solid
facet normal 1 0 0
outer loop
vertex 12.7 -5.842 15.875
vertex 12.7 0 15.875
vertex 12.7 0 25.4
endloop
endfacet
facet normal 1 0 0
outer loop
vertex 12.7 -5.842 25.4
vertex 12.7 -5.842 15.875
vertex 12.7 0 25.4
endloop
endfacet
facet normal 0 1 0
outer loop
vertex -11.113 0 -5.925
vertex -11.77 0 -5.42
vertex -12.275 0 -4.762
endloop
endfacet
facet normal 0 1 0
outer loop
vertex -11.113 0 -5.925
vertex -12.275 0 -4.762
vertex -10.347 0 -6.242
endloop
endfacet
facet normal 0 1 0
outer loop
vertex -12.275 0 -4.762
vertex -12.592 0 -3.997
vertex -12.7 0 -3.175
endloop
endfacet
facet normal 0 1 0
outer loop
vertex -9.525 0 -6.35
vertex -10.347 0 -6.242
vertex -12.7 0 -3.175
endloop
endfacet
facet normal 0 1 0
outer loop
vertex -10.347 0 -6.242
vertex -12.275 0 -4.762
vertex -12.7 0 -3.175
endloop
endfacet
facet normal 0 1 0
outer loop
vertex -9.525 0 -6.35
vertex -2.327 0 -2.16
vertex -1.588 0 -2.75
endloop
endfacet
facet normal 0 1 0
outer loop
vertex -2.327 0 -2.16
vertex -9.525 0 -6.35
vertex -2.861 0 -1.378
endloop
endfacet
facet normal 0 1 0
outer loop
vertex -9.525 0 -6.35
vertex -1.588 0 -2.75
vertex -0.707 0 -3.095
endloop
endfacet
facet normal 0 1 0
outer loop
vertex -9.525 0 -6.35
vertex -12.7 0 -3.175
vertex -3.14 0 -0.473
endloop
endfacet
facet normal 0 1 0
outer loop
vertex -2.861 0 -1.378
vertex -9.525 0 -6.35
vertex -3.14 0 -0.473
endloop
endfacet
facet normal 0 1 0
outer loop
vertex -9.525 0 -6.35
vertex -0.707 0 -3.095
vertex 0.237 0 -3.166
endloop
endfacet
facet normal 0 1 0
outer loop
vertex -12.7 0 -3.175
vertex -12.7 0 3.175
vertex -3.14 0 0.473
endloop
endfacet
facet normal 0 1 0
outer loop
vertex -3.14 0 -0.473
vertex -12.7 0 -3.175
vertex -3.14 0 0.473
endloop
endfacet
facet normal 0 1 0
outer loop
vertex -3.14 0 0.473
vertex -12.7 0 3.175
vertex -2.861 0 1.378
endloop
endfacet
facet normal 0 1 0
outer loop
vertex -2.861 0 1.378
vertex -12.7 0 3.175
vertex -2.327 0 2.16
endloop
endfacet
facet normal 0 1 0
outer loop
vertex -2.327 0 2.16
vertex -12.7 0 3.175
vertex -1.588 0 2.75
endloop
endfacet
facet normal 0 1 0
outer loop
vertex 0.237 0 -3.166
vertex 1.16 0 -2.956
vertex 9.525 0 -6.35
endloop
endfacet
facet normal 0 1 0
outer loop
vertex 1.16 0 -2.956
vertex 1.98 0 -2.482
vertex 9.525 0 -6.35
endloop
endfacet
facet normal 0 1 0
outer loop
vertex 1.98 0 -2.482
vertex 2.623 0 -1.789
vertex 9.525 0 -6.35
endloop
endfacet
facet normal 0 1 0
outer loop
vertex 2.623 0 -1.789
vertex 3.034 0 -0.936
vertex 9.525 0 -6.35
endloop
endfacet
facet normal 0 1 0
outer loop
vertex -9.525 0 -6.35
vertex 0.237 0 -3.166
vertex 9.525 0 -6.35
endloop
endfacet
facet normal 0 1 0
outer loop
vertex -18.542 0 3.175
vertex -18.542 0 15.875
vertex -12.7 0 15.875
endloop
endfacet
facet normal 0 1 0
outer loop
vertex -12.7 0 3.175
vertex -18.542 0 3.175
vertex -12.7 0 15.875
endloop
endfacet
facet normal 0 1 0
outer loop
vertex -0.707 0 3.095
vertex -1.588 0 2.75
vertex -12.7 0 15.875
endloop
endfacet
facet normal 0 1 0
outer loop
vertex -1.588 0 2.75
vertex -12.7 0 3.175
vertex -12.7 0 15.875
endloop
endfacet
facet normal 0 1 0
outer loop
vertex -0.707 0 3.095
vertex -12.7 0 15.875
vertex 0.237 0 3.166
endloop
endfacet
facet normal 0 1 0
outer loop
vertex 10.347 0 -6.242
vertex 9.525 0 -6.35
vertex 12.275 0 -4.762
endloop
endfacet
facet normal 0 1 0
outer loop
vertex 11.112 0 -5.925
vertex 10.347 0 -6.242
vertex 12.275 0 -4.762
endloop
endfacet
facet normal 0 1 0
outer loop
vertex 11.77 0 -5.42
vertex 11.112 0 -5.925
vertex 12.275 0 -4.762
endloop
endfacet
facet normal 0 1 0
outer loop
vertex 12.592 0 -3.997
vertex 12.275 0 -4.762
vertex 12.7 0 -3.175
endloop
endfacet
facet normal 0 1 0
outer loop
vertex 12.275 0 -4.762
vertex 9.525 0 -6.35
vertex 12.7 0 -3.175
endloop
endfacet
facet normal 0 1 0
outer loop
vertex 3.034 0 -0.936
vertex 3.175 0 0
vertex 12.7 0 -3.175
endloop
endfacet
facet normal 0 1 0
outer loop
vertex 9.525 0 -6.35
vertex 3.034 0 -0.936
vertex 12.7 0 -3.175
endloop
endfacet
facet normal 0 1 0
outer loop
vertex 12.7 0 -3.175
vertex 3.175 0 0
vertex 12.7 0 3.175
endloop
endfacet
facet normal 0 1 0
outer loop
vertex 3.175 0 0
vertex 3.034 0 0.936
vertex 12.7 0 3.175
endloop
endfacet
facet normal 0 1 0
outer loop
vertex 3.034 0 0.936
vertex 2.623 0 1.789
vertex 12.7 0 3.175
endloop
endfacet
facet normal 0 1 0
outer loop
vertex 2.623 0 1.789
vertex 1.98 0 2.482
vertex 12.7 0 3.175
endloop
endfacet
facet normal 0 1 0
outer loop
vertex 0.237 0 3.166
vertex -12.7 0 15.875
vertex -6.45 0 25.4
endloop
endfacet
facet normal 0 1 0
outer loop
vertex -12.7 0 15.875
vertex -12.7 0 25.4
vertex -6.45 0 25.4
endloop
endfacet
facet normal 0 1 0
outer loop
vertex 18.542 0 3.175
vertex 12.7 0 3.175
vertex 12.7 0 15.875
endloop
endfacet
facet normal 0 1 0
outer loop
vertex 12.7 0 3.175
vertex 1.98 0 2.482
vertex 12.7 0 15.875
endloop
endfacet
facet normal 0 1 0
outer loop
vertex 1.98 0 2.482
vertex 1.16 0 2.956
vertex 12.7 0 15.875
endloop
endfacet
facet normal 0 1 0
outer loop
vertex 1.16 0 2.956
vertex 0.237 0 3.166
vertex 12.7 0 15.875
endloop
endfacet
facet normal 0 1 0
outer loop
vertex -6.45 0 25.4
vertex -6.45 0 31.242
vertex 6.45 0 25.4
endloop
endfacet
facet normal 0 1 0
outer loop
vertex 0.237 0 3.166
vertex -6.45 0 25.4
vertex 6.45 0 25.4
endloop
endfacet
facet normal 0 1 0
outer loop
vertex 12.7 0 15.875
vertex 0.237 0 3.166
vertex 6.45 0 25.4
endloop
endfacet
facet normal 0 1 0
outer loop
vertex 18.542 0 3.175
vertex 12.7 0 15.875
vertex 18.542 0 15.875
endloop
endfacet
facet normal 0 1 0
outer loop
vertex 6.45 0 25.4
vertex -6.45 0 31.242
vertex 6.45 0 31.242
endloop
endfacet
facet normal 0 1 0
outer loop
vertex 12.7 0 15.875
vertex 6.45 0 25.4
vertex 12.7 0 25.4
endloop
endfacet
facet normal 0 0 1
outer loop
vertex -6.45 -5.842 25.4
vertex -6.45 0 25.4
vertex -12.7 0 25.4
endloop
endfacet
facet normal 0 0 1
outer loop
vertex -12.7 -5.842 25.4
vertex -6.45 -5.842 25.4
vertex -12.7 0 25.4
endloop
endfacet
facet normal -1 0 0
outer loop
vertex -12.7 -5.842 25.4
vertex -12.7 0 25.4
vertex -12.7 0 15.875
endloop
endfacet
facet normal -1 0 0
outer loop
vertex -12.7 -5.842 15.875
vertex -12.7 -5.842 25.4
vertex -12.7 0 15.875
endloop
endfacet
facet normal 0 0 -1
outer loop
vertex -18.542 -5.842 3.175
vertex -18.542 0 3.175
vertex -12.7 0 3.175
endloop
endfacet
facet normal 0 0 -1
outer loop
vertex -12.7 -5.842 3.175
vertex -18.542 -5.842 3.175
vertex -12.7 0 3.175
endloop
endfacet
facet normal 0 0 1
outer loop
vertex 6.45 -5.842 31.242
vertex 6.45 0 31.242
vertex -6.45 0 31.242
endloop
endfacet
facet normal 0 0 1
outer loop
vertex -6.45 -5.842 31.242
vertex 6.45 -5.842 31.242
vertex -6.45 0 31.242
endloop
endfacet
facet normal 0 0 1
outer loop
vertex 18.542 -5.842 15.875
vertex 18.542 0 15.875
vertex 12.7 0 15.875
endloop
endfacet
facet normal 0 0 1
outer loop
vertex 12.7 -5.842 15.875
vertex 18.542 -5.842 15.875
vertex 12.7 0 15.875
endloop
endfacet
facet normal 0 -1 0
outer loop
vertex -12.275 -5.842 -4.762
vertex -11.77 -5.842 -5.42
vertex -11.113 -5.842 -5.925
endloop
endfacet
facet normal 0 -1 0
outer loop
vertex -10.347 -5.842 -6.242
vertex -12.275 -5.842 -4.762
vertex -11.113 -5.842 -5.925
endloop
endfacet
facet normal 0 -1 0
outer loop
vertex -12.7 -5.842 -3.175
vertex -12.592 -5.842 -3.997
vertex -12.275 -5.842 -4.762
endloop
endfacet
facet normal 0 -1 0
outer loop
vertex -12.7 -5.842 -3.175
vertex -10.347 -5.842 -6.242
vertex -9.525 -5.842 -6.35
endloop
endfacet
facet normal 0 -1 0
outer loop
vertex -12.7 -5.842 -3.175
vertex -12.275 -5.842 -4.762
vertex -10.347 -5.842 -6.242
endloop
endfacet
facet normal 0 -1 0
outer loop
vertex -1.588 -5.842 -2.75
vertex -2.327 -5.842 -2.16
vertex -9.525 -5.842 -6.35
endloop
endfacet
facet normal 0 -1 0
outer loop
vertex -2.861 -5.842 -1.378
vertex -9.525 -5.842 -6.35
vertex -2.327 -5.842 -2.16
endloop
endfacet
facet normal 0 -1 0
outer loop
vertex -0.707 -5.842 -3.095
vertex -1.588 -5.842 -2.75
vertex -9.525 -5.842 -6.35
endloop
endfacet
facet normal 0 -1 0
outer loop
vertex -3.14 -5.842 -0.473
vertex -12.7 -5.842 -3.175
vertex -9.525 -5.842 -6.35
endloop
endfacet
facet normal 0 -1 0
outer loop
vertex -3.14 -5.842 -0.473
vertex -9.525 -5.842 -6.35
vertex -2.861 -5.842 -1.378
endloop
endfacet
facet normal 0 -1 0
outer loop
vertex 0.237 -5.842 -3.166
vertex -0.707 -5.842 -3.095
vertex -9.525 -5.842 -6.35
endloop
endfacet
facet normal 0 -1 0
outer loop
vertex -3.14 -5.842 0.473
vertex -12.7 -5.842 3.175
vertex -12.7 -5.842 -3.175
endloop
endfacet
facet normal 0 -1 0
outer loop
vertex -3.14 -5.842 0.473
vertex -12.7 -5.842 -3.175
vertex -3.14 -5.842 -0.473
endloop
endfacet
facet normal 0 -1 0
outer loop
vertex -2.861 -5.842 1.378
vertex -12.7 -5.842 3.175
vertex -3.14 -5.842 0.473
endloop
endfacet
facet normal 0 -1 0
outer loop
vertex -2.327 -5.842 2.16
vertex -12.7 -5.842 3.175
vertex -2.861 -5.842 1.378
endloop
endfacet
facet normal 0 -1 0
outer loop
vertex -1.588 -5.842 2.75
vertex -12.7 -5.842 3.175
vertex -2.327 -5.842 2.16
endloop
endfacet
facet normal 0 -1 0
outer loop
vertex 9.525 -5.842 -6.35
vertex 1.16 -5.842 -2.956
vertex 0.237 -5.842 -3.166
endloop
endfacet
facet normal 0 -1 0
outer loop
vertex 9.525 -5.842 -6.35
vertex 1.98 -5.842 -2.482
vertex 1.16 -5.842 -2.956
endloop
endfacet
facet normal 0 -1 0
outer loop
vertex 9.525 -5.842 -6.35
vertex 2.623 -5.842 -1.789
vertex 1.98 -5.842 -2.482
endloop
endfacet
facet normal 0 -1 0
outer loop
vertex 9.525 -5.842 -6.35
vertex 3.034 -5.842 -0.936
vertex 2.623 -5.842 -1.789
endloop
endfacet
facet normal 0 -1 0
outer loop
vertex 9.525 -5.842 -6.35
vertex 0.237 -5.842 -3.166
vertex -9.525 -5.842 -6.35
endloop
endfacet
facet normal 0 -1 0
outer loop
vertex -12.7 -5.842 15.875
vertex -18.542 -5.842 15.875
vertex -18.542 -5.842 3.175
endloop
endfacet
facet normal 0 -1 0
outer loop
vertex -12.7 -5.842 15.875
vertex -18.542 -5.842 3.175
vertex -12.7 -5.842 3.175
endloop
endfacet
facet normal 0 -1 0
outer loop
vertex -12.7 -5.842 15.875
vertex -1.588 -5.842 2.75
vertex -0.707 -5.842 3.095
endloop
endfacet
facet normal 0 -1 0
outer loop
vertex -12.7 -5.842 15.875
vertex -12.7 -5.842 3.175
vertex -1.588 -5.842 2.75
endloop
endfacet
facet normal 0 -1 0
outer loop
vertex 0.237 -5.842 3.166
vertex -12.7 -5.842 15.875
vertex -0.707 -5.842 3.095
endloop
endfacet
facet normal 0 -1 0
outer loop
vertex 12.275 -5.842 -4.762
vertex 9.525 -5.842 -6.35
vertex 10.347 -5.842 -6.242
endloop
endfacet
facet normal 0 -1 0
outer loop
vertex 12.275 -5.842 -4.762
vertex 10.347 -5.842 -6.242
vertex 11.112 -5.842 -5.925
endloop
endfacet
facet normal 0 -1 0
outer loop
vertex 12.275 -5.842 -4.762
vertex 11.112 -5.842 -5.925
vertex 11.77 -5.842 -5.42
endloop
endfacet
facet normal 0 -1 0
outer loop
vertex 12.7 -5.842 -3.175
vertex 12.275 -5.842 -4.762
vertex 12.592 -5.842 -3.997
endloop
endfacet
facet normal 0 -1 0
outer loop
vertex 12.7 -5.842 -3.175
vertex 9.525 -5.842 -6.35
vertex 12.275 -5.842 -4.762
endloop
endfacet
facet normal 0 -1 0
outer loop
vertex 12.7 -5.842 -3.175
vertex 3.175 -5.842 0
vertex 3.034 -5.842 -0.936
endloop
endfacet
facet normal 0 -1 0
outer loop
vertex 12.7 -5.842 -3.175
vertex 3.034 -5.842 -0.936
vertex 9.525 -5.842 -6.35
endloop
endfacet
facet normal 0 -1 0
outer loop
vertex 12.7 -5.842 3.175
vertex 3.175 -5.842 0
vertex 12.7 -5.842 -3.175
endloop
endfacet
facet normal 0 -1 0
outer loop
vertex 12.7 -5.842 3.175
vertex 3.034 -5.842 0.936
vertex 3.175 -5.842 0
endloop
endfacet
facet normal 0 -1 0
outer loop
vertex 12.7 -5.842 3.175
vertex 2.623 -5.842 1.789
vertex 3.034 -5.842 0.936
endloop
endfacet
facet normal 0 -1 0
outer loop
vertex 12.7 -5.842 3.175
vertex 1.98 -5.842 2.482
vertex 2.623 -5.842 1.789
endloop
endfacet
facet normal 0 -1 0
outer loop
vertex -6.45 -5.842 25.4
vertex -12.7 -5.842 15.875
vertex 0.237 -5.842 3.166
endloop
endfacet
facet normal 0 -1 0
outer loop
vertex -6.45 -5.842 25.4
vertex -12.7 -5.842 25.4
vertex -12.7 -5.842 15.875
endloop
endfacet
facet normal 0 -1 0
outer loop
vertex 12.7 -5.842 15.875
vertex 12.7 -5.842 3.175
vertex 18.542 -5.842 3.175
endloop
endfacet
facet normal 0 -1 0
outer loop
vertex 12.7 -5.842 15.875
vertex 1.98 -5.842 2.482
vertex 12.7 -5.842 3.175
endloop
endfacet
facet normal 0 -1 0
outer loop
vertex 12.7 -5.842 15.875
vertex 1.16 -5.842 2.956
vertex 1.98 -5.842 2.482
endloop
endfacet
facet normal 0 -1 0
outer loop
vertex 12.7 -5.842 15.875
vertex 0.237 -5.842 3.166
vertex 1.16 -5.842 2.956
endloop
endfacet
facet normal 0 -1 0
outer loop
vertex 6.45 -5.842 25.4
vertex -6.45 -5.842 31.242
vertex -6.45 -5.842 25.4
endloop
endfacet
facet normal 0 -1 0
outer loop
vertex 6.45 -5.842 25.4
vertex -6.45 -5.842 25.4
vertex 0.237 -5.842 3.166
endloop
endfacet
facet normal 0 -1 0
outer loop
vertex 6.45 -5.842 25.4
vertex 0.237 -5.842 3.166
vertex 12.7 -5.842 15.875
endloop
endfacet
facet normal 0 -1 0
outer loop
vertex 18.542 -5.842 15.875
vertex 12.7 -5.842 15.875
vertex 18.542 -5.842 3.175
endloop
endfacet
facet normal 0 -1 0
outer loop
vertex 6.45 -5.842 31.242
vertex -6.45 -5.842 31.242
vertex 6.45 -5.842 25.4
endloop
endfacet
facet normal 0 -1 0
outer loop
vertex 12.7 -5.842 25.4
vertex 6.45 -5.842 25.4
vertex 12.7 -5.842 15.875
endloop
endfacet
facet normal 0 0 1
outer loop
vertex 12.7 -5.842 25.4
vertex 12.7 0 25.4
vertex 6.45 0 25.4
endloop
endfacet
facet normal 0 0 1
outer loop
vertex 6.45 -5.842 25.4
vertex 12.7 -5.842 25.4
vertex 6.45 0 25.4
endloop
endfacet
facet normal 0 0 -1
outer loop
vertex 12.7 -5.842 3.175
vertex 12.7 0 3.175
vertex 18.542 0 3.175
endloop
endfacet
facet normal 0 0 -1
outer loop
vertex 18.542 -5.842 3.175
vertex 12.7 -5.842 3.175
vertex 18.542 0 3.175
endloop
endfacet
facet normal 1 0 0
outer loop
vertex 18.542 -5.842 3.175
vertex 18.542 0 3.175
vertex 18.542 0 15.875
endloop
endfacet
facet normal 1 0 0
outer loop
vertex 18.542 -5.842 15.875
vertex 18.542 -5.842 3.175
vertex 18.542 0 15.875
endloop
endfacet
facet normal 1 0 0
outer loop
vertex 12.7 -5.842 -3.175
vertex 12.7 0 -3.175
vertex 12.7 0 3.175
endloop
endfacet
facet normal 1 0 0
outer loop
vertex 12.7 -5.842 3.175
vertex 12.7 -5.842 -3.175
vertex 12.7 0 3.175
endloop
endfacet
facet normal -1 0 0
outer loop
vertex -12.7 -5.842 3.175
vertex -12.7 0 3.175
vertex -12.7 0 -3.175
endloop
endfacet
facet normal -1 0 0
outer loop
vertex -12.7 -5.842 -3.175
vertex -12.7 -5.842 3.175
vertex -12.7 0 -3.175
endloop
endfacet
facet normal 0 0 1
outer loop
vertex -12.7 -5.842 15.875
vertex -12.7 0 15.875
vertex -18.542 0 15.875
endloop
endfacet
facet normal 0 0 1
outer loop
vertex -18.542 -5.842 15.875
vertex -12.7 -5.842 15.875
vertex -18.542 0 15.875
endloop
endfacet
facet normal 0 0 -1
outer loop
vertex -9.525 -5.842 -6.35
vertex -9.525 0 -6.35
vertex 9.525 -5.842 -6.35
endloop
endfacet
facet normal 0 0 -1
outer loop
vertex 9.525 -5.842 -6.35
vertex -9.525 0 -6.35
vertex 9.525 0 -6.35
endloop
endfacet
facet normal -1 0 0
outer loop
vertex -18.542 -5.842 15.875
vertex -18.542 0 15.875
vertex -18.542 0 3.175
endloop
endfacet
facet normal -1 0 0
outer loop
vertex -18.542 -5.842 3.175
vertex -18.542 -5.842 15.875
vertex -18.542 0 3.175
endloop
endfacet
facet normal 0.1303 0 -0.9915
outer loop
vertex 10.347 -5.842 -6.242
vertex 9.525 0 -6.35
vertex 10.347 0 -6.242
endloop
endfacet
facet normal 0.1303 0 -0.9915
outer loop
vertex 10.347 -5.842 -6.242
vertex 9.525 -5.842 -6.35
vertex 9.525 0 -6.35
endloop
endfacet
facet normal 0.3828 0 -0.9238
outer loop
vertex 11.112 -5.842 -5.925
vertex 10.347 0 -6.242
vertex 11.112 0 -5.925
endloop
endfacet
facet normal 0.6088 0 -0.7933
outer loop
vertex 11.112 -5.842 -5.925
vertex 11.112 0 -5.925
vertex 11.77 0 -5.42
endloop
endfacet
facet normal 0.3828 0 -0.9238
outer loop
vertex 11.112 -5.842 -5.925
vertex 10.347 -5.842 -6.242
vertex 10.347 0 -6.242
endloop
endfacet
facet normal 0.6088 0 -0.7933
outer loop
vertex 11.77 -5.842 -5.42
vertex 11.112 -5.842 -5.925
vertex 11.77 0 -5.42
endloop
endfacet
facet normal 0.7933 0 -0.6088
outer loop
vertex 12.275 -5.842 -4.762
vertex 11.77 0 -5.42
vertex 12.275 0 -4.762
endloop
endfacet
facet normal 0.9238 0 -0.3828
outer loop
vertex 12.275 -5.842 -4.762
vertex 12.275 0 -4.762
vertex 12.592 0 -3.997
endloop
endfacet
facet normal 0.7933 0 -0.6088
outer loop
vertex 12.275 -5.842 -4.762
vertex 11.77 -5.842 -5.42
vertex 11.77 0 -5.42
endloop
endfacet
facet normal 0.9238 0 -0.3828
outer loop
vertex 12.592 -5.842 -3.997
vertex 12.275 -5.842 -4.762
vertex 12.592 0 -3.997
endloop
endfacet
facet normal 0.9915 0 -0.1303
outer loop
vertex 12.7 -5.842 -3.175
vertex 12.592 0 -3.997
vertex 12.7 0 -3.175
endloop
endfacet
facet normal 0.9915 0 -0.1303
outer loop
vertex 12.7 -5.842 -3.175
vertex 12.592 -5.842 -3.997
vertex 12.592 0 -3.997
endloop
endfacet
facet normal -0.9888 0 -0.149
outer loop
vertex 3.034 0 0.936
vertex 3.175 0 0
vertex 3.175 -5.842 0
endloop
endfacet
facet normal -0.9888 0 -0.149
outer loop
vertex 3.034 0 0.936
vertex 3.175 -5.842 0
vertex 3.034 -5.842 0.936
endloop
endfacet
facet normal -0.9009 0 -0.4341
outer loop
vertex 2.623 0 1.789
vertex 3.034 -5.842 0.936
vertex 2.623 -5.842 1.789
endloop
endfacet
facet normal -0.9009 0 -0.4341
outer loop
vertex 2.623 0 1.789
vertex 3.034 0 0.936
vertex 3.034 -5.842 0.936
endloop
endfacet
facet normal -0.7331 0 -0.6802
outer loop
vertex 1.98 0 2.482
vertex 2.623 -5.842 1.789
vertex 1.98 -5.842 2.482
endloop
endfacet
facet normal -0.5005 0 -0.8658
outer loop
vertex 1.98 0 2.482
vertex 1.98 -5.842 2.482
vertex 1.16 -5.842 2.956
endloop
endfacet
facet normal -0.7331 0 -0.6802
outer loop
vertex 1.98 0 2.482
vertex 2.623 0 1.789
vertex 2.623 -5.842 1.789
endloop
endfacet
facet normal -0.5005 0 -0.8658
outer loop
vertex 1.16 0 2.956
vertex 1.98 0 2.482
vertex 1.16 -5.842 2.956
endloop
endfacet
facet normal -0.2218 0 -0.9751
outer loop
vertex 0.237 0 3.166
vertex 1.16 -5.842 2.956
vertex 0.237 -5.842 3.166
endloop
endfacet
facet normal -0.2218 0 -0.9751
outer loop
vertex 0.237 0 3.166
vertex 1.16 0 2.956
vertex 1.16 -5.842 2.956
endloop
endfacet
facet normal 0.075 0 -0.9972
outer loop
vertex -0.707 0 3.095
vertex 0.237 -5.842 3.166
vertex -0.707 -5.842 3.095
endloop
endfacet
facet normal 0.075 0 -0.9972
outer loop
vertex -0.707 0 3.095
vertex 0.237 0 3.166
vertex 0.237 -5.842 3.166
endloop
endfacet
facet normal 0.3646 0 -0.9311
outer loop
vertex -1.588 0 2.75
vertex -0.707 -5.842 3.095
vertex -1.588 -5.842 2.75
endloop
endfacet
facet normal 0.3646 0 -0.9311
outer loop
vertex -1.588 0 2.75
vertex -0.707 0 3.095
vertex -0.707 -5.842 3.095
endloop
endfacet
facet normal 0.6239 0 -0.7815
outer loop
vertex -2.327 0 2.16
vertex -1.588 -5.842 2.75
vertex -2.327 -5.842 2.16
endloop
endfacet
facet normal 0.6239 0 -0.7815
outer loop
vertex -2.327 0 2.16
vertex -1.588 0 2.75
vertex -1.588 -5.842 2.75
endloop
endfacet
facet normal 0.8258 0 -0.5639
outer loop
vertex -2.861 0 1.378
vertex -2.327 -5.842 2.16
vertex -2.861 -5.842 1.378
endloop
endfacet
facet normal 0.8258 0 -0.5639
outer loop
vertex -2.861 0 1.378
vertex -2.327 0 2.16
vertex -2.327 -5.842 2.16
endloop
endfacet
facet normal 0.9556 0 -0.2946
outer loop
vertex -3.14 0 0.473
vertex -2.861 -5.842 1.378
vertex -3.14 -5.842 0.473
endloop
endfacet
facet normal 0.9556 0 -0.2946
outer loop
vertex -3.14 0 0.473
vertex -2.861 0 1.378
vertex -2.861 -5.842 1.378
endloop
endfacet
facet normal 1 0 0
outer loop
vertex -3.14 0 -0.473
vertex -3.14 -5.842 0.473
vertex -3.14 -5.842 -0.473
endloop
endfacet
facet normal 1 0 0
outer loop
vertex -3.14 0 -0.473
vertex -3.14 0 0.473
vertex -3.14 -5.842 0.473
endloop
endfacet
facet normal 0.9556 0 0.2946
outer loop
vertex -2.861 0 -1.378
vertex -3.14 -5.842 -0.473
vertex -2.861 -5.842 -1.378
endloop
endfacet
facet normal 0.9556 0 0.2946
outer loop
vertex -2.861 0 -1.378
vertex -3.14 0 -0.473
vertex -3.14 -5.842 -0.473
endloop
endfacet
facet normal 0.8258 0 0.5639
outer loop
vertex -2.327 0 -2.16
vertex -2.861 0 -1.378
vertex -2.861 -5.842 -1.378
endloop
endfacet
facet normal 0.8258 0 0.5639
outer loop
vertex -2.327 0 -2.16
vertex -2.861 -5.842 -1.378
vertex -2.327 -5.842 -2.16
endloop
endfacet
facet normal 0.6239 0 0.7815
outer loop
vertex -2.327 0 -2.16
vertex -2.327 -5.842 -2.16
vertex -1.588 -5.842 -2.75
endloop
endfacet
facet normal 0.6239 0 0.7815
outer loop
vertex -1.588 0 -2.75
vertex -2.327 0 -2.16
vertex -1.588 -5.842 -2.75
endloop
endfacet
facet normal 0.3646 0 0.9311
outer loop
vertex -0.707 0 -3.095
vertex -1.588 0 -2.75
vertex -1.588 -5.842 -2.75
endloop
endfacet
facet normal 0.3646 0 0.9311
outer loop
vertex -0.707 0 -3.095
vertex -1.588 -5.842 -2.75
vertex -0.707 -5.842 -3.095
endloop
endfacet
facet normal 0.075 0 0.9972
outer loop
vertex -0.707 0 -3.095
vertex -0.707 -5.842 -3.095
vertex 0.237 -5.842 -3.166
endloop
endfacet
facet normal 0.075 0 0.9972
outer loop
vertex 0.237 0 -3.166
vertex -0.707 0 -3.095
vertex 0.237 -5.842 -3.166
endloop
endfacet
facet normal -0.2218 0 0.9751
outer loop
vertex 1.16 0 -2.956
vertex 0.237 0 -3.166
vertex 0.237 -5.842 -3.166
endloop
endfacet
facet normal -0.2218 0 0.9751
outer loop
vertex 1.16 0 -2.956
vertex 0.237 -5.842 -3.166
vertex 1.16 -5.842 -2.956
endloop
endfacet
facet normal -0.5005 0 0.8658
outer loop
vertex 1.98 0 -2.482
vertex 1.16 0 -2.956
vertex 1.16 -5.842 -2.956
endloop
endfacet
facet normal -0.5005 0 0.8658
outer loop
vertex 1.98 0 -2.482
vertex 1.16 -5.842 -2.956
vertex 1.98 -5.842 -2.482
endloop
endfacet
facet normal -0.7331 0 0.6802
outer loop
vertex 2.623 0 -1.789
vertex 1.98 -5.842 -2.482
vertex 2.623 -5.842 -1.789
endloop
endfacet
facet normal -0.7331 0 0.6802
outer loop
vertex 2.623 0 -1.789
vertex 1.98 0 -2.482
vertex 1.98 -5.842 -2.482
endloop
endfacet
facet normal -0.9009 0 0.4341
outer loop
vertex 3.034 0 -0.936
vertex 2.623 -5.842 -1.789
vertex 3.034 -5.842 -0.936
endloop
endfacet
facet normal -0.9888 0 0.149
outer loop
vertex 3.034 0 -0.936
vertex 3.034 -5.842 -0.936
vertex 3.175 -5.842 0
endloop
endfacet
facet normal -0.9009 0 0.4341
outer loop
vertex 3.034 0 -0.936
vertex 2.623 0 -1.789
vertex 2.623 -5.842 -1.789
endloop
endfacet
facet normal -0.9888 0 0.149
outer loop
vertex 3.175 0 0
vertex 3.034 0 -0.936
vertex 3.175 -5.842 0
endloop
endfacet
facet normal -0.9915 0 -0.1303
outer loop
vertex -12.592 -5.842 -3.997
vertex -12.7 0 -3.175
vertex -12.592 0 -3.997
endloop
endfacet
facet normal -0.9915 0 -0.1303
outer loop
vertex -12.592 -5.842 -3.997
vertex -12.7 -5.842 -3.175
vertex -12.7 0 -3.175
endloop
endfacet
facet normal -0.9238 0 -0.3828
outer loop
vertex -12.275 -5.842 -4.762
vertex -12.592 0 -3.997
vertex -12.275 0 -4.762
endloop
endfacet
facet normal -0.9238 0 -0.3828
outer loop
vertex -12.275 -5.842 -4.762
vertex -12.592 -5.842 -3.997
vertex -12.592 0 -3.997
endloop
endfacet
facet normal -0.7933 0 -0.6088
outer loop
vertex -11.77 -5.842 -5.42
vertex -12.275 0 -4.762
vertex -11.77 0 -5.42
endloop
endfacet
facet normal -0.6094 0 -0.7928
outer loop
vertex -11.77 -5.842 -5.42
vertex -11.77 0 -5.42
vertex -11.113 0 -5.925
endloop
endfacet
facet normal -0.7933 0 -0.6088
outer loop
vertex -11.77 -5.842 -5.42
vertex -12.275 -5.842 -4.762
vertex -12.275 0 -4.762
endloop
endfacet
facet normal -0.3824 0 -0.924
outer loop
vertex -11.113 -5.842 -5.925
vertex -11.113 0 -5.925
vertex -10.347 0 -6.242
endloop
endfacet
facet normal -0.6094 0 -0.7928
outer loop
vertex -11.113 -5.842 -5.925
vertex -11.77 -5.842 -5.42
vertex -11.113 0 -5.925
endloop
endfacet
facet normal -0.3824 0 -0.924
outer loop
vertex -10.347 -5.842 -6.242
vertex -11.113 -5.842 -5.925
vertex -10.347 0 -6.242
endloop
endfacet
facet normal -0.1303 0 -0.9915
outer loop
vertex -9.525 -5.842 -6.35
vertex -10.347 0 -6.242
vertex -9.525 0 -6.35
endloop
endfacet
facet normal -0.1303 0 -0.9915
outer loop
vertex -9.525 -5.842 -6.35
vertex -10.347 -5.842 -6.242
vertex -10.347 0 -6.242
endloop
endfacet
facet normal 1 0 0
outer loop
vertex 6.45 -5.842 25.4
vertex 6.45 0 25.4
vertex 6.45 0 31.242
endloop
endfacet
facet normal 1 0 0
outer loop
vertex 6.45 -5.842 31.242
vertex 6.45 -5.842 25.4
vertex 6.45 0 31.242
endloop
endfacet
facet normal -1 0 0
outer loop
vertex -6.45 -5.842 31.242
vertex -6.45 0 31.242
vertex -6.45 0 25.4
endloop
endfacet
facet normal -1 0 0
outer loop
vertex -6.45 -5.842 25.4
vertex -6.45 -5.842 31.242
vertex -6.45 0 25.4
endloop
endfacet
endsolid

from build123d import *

# Parameters (mm, degrees)
F0_R     = 3.175
F1_DEPTH = 5.842
F2_R     = 3.175


with BuildPart() as f1:
    # F0 (on Front) → F1 (new body)
    with BuildSketch(Plane.XZ):
        Polygon((-12.7, 3.175), (-12.7, -6.35), (12.7, -6.35), (12.7, 3.175), (18.542, 3.175), (18.542, 15.875), (12.7, 15.875), (12.7, 25.4), (6.45, 25.4), (6.45, 31.242), (-6.45, 31.242), (-6.45, 25.4), (-12.7, 25.4), (-12.7, 15.875), (-18.542, 15.875), (-18.542, 3.175), align=None)
        Circle(F0_R, mode=Mode.SUBTRACT)
    extrude(amount=F1_DEPTH)

    # F2
    f2_edges = [f1.edges().sort_by_distance(p)[0] for p in [
        (-12.7, -2.921, -6.35),
        (12.7, -2.921, -6.35),
    ]]
    fillet(f2_edges, radius=F2_R)


solid = f1.part
